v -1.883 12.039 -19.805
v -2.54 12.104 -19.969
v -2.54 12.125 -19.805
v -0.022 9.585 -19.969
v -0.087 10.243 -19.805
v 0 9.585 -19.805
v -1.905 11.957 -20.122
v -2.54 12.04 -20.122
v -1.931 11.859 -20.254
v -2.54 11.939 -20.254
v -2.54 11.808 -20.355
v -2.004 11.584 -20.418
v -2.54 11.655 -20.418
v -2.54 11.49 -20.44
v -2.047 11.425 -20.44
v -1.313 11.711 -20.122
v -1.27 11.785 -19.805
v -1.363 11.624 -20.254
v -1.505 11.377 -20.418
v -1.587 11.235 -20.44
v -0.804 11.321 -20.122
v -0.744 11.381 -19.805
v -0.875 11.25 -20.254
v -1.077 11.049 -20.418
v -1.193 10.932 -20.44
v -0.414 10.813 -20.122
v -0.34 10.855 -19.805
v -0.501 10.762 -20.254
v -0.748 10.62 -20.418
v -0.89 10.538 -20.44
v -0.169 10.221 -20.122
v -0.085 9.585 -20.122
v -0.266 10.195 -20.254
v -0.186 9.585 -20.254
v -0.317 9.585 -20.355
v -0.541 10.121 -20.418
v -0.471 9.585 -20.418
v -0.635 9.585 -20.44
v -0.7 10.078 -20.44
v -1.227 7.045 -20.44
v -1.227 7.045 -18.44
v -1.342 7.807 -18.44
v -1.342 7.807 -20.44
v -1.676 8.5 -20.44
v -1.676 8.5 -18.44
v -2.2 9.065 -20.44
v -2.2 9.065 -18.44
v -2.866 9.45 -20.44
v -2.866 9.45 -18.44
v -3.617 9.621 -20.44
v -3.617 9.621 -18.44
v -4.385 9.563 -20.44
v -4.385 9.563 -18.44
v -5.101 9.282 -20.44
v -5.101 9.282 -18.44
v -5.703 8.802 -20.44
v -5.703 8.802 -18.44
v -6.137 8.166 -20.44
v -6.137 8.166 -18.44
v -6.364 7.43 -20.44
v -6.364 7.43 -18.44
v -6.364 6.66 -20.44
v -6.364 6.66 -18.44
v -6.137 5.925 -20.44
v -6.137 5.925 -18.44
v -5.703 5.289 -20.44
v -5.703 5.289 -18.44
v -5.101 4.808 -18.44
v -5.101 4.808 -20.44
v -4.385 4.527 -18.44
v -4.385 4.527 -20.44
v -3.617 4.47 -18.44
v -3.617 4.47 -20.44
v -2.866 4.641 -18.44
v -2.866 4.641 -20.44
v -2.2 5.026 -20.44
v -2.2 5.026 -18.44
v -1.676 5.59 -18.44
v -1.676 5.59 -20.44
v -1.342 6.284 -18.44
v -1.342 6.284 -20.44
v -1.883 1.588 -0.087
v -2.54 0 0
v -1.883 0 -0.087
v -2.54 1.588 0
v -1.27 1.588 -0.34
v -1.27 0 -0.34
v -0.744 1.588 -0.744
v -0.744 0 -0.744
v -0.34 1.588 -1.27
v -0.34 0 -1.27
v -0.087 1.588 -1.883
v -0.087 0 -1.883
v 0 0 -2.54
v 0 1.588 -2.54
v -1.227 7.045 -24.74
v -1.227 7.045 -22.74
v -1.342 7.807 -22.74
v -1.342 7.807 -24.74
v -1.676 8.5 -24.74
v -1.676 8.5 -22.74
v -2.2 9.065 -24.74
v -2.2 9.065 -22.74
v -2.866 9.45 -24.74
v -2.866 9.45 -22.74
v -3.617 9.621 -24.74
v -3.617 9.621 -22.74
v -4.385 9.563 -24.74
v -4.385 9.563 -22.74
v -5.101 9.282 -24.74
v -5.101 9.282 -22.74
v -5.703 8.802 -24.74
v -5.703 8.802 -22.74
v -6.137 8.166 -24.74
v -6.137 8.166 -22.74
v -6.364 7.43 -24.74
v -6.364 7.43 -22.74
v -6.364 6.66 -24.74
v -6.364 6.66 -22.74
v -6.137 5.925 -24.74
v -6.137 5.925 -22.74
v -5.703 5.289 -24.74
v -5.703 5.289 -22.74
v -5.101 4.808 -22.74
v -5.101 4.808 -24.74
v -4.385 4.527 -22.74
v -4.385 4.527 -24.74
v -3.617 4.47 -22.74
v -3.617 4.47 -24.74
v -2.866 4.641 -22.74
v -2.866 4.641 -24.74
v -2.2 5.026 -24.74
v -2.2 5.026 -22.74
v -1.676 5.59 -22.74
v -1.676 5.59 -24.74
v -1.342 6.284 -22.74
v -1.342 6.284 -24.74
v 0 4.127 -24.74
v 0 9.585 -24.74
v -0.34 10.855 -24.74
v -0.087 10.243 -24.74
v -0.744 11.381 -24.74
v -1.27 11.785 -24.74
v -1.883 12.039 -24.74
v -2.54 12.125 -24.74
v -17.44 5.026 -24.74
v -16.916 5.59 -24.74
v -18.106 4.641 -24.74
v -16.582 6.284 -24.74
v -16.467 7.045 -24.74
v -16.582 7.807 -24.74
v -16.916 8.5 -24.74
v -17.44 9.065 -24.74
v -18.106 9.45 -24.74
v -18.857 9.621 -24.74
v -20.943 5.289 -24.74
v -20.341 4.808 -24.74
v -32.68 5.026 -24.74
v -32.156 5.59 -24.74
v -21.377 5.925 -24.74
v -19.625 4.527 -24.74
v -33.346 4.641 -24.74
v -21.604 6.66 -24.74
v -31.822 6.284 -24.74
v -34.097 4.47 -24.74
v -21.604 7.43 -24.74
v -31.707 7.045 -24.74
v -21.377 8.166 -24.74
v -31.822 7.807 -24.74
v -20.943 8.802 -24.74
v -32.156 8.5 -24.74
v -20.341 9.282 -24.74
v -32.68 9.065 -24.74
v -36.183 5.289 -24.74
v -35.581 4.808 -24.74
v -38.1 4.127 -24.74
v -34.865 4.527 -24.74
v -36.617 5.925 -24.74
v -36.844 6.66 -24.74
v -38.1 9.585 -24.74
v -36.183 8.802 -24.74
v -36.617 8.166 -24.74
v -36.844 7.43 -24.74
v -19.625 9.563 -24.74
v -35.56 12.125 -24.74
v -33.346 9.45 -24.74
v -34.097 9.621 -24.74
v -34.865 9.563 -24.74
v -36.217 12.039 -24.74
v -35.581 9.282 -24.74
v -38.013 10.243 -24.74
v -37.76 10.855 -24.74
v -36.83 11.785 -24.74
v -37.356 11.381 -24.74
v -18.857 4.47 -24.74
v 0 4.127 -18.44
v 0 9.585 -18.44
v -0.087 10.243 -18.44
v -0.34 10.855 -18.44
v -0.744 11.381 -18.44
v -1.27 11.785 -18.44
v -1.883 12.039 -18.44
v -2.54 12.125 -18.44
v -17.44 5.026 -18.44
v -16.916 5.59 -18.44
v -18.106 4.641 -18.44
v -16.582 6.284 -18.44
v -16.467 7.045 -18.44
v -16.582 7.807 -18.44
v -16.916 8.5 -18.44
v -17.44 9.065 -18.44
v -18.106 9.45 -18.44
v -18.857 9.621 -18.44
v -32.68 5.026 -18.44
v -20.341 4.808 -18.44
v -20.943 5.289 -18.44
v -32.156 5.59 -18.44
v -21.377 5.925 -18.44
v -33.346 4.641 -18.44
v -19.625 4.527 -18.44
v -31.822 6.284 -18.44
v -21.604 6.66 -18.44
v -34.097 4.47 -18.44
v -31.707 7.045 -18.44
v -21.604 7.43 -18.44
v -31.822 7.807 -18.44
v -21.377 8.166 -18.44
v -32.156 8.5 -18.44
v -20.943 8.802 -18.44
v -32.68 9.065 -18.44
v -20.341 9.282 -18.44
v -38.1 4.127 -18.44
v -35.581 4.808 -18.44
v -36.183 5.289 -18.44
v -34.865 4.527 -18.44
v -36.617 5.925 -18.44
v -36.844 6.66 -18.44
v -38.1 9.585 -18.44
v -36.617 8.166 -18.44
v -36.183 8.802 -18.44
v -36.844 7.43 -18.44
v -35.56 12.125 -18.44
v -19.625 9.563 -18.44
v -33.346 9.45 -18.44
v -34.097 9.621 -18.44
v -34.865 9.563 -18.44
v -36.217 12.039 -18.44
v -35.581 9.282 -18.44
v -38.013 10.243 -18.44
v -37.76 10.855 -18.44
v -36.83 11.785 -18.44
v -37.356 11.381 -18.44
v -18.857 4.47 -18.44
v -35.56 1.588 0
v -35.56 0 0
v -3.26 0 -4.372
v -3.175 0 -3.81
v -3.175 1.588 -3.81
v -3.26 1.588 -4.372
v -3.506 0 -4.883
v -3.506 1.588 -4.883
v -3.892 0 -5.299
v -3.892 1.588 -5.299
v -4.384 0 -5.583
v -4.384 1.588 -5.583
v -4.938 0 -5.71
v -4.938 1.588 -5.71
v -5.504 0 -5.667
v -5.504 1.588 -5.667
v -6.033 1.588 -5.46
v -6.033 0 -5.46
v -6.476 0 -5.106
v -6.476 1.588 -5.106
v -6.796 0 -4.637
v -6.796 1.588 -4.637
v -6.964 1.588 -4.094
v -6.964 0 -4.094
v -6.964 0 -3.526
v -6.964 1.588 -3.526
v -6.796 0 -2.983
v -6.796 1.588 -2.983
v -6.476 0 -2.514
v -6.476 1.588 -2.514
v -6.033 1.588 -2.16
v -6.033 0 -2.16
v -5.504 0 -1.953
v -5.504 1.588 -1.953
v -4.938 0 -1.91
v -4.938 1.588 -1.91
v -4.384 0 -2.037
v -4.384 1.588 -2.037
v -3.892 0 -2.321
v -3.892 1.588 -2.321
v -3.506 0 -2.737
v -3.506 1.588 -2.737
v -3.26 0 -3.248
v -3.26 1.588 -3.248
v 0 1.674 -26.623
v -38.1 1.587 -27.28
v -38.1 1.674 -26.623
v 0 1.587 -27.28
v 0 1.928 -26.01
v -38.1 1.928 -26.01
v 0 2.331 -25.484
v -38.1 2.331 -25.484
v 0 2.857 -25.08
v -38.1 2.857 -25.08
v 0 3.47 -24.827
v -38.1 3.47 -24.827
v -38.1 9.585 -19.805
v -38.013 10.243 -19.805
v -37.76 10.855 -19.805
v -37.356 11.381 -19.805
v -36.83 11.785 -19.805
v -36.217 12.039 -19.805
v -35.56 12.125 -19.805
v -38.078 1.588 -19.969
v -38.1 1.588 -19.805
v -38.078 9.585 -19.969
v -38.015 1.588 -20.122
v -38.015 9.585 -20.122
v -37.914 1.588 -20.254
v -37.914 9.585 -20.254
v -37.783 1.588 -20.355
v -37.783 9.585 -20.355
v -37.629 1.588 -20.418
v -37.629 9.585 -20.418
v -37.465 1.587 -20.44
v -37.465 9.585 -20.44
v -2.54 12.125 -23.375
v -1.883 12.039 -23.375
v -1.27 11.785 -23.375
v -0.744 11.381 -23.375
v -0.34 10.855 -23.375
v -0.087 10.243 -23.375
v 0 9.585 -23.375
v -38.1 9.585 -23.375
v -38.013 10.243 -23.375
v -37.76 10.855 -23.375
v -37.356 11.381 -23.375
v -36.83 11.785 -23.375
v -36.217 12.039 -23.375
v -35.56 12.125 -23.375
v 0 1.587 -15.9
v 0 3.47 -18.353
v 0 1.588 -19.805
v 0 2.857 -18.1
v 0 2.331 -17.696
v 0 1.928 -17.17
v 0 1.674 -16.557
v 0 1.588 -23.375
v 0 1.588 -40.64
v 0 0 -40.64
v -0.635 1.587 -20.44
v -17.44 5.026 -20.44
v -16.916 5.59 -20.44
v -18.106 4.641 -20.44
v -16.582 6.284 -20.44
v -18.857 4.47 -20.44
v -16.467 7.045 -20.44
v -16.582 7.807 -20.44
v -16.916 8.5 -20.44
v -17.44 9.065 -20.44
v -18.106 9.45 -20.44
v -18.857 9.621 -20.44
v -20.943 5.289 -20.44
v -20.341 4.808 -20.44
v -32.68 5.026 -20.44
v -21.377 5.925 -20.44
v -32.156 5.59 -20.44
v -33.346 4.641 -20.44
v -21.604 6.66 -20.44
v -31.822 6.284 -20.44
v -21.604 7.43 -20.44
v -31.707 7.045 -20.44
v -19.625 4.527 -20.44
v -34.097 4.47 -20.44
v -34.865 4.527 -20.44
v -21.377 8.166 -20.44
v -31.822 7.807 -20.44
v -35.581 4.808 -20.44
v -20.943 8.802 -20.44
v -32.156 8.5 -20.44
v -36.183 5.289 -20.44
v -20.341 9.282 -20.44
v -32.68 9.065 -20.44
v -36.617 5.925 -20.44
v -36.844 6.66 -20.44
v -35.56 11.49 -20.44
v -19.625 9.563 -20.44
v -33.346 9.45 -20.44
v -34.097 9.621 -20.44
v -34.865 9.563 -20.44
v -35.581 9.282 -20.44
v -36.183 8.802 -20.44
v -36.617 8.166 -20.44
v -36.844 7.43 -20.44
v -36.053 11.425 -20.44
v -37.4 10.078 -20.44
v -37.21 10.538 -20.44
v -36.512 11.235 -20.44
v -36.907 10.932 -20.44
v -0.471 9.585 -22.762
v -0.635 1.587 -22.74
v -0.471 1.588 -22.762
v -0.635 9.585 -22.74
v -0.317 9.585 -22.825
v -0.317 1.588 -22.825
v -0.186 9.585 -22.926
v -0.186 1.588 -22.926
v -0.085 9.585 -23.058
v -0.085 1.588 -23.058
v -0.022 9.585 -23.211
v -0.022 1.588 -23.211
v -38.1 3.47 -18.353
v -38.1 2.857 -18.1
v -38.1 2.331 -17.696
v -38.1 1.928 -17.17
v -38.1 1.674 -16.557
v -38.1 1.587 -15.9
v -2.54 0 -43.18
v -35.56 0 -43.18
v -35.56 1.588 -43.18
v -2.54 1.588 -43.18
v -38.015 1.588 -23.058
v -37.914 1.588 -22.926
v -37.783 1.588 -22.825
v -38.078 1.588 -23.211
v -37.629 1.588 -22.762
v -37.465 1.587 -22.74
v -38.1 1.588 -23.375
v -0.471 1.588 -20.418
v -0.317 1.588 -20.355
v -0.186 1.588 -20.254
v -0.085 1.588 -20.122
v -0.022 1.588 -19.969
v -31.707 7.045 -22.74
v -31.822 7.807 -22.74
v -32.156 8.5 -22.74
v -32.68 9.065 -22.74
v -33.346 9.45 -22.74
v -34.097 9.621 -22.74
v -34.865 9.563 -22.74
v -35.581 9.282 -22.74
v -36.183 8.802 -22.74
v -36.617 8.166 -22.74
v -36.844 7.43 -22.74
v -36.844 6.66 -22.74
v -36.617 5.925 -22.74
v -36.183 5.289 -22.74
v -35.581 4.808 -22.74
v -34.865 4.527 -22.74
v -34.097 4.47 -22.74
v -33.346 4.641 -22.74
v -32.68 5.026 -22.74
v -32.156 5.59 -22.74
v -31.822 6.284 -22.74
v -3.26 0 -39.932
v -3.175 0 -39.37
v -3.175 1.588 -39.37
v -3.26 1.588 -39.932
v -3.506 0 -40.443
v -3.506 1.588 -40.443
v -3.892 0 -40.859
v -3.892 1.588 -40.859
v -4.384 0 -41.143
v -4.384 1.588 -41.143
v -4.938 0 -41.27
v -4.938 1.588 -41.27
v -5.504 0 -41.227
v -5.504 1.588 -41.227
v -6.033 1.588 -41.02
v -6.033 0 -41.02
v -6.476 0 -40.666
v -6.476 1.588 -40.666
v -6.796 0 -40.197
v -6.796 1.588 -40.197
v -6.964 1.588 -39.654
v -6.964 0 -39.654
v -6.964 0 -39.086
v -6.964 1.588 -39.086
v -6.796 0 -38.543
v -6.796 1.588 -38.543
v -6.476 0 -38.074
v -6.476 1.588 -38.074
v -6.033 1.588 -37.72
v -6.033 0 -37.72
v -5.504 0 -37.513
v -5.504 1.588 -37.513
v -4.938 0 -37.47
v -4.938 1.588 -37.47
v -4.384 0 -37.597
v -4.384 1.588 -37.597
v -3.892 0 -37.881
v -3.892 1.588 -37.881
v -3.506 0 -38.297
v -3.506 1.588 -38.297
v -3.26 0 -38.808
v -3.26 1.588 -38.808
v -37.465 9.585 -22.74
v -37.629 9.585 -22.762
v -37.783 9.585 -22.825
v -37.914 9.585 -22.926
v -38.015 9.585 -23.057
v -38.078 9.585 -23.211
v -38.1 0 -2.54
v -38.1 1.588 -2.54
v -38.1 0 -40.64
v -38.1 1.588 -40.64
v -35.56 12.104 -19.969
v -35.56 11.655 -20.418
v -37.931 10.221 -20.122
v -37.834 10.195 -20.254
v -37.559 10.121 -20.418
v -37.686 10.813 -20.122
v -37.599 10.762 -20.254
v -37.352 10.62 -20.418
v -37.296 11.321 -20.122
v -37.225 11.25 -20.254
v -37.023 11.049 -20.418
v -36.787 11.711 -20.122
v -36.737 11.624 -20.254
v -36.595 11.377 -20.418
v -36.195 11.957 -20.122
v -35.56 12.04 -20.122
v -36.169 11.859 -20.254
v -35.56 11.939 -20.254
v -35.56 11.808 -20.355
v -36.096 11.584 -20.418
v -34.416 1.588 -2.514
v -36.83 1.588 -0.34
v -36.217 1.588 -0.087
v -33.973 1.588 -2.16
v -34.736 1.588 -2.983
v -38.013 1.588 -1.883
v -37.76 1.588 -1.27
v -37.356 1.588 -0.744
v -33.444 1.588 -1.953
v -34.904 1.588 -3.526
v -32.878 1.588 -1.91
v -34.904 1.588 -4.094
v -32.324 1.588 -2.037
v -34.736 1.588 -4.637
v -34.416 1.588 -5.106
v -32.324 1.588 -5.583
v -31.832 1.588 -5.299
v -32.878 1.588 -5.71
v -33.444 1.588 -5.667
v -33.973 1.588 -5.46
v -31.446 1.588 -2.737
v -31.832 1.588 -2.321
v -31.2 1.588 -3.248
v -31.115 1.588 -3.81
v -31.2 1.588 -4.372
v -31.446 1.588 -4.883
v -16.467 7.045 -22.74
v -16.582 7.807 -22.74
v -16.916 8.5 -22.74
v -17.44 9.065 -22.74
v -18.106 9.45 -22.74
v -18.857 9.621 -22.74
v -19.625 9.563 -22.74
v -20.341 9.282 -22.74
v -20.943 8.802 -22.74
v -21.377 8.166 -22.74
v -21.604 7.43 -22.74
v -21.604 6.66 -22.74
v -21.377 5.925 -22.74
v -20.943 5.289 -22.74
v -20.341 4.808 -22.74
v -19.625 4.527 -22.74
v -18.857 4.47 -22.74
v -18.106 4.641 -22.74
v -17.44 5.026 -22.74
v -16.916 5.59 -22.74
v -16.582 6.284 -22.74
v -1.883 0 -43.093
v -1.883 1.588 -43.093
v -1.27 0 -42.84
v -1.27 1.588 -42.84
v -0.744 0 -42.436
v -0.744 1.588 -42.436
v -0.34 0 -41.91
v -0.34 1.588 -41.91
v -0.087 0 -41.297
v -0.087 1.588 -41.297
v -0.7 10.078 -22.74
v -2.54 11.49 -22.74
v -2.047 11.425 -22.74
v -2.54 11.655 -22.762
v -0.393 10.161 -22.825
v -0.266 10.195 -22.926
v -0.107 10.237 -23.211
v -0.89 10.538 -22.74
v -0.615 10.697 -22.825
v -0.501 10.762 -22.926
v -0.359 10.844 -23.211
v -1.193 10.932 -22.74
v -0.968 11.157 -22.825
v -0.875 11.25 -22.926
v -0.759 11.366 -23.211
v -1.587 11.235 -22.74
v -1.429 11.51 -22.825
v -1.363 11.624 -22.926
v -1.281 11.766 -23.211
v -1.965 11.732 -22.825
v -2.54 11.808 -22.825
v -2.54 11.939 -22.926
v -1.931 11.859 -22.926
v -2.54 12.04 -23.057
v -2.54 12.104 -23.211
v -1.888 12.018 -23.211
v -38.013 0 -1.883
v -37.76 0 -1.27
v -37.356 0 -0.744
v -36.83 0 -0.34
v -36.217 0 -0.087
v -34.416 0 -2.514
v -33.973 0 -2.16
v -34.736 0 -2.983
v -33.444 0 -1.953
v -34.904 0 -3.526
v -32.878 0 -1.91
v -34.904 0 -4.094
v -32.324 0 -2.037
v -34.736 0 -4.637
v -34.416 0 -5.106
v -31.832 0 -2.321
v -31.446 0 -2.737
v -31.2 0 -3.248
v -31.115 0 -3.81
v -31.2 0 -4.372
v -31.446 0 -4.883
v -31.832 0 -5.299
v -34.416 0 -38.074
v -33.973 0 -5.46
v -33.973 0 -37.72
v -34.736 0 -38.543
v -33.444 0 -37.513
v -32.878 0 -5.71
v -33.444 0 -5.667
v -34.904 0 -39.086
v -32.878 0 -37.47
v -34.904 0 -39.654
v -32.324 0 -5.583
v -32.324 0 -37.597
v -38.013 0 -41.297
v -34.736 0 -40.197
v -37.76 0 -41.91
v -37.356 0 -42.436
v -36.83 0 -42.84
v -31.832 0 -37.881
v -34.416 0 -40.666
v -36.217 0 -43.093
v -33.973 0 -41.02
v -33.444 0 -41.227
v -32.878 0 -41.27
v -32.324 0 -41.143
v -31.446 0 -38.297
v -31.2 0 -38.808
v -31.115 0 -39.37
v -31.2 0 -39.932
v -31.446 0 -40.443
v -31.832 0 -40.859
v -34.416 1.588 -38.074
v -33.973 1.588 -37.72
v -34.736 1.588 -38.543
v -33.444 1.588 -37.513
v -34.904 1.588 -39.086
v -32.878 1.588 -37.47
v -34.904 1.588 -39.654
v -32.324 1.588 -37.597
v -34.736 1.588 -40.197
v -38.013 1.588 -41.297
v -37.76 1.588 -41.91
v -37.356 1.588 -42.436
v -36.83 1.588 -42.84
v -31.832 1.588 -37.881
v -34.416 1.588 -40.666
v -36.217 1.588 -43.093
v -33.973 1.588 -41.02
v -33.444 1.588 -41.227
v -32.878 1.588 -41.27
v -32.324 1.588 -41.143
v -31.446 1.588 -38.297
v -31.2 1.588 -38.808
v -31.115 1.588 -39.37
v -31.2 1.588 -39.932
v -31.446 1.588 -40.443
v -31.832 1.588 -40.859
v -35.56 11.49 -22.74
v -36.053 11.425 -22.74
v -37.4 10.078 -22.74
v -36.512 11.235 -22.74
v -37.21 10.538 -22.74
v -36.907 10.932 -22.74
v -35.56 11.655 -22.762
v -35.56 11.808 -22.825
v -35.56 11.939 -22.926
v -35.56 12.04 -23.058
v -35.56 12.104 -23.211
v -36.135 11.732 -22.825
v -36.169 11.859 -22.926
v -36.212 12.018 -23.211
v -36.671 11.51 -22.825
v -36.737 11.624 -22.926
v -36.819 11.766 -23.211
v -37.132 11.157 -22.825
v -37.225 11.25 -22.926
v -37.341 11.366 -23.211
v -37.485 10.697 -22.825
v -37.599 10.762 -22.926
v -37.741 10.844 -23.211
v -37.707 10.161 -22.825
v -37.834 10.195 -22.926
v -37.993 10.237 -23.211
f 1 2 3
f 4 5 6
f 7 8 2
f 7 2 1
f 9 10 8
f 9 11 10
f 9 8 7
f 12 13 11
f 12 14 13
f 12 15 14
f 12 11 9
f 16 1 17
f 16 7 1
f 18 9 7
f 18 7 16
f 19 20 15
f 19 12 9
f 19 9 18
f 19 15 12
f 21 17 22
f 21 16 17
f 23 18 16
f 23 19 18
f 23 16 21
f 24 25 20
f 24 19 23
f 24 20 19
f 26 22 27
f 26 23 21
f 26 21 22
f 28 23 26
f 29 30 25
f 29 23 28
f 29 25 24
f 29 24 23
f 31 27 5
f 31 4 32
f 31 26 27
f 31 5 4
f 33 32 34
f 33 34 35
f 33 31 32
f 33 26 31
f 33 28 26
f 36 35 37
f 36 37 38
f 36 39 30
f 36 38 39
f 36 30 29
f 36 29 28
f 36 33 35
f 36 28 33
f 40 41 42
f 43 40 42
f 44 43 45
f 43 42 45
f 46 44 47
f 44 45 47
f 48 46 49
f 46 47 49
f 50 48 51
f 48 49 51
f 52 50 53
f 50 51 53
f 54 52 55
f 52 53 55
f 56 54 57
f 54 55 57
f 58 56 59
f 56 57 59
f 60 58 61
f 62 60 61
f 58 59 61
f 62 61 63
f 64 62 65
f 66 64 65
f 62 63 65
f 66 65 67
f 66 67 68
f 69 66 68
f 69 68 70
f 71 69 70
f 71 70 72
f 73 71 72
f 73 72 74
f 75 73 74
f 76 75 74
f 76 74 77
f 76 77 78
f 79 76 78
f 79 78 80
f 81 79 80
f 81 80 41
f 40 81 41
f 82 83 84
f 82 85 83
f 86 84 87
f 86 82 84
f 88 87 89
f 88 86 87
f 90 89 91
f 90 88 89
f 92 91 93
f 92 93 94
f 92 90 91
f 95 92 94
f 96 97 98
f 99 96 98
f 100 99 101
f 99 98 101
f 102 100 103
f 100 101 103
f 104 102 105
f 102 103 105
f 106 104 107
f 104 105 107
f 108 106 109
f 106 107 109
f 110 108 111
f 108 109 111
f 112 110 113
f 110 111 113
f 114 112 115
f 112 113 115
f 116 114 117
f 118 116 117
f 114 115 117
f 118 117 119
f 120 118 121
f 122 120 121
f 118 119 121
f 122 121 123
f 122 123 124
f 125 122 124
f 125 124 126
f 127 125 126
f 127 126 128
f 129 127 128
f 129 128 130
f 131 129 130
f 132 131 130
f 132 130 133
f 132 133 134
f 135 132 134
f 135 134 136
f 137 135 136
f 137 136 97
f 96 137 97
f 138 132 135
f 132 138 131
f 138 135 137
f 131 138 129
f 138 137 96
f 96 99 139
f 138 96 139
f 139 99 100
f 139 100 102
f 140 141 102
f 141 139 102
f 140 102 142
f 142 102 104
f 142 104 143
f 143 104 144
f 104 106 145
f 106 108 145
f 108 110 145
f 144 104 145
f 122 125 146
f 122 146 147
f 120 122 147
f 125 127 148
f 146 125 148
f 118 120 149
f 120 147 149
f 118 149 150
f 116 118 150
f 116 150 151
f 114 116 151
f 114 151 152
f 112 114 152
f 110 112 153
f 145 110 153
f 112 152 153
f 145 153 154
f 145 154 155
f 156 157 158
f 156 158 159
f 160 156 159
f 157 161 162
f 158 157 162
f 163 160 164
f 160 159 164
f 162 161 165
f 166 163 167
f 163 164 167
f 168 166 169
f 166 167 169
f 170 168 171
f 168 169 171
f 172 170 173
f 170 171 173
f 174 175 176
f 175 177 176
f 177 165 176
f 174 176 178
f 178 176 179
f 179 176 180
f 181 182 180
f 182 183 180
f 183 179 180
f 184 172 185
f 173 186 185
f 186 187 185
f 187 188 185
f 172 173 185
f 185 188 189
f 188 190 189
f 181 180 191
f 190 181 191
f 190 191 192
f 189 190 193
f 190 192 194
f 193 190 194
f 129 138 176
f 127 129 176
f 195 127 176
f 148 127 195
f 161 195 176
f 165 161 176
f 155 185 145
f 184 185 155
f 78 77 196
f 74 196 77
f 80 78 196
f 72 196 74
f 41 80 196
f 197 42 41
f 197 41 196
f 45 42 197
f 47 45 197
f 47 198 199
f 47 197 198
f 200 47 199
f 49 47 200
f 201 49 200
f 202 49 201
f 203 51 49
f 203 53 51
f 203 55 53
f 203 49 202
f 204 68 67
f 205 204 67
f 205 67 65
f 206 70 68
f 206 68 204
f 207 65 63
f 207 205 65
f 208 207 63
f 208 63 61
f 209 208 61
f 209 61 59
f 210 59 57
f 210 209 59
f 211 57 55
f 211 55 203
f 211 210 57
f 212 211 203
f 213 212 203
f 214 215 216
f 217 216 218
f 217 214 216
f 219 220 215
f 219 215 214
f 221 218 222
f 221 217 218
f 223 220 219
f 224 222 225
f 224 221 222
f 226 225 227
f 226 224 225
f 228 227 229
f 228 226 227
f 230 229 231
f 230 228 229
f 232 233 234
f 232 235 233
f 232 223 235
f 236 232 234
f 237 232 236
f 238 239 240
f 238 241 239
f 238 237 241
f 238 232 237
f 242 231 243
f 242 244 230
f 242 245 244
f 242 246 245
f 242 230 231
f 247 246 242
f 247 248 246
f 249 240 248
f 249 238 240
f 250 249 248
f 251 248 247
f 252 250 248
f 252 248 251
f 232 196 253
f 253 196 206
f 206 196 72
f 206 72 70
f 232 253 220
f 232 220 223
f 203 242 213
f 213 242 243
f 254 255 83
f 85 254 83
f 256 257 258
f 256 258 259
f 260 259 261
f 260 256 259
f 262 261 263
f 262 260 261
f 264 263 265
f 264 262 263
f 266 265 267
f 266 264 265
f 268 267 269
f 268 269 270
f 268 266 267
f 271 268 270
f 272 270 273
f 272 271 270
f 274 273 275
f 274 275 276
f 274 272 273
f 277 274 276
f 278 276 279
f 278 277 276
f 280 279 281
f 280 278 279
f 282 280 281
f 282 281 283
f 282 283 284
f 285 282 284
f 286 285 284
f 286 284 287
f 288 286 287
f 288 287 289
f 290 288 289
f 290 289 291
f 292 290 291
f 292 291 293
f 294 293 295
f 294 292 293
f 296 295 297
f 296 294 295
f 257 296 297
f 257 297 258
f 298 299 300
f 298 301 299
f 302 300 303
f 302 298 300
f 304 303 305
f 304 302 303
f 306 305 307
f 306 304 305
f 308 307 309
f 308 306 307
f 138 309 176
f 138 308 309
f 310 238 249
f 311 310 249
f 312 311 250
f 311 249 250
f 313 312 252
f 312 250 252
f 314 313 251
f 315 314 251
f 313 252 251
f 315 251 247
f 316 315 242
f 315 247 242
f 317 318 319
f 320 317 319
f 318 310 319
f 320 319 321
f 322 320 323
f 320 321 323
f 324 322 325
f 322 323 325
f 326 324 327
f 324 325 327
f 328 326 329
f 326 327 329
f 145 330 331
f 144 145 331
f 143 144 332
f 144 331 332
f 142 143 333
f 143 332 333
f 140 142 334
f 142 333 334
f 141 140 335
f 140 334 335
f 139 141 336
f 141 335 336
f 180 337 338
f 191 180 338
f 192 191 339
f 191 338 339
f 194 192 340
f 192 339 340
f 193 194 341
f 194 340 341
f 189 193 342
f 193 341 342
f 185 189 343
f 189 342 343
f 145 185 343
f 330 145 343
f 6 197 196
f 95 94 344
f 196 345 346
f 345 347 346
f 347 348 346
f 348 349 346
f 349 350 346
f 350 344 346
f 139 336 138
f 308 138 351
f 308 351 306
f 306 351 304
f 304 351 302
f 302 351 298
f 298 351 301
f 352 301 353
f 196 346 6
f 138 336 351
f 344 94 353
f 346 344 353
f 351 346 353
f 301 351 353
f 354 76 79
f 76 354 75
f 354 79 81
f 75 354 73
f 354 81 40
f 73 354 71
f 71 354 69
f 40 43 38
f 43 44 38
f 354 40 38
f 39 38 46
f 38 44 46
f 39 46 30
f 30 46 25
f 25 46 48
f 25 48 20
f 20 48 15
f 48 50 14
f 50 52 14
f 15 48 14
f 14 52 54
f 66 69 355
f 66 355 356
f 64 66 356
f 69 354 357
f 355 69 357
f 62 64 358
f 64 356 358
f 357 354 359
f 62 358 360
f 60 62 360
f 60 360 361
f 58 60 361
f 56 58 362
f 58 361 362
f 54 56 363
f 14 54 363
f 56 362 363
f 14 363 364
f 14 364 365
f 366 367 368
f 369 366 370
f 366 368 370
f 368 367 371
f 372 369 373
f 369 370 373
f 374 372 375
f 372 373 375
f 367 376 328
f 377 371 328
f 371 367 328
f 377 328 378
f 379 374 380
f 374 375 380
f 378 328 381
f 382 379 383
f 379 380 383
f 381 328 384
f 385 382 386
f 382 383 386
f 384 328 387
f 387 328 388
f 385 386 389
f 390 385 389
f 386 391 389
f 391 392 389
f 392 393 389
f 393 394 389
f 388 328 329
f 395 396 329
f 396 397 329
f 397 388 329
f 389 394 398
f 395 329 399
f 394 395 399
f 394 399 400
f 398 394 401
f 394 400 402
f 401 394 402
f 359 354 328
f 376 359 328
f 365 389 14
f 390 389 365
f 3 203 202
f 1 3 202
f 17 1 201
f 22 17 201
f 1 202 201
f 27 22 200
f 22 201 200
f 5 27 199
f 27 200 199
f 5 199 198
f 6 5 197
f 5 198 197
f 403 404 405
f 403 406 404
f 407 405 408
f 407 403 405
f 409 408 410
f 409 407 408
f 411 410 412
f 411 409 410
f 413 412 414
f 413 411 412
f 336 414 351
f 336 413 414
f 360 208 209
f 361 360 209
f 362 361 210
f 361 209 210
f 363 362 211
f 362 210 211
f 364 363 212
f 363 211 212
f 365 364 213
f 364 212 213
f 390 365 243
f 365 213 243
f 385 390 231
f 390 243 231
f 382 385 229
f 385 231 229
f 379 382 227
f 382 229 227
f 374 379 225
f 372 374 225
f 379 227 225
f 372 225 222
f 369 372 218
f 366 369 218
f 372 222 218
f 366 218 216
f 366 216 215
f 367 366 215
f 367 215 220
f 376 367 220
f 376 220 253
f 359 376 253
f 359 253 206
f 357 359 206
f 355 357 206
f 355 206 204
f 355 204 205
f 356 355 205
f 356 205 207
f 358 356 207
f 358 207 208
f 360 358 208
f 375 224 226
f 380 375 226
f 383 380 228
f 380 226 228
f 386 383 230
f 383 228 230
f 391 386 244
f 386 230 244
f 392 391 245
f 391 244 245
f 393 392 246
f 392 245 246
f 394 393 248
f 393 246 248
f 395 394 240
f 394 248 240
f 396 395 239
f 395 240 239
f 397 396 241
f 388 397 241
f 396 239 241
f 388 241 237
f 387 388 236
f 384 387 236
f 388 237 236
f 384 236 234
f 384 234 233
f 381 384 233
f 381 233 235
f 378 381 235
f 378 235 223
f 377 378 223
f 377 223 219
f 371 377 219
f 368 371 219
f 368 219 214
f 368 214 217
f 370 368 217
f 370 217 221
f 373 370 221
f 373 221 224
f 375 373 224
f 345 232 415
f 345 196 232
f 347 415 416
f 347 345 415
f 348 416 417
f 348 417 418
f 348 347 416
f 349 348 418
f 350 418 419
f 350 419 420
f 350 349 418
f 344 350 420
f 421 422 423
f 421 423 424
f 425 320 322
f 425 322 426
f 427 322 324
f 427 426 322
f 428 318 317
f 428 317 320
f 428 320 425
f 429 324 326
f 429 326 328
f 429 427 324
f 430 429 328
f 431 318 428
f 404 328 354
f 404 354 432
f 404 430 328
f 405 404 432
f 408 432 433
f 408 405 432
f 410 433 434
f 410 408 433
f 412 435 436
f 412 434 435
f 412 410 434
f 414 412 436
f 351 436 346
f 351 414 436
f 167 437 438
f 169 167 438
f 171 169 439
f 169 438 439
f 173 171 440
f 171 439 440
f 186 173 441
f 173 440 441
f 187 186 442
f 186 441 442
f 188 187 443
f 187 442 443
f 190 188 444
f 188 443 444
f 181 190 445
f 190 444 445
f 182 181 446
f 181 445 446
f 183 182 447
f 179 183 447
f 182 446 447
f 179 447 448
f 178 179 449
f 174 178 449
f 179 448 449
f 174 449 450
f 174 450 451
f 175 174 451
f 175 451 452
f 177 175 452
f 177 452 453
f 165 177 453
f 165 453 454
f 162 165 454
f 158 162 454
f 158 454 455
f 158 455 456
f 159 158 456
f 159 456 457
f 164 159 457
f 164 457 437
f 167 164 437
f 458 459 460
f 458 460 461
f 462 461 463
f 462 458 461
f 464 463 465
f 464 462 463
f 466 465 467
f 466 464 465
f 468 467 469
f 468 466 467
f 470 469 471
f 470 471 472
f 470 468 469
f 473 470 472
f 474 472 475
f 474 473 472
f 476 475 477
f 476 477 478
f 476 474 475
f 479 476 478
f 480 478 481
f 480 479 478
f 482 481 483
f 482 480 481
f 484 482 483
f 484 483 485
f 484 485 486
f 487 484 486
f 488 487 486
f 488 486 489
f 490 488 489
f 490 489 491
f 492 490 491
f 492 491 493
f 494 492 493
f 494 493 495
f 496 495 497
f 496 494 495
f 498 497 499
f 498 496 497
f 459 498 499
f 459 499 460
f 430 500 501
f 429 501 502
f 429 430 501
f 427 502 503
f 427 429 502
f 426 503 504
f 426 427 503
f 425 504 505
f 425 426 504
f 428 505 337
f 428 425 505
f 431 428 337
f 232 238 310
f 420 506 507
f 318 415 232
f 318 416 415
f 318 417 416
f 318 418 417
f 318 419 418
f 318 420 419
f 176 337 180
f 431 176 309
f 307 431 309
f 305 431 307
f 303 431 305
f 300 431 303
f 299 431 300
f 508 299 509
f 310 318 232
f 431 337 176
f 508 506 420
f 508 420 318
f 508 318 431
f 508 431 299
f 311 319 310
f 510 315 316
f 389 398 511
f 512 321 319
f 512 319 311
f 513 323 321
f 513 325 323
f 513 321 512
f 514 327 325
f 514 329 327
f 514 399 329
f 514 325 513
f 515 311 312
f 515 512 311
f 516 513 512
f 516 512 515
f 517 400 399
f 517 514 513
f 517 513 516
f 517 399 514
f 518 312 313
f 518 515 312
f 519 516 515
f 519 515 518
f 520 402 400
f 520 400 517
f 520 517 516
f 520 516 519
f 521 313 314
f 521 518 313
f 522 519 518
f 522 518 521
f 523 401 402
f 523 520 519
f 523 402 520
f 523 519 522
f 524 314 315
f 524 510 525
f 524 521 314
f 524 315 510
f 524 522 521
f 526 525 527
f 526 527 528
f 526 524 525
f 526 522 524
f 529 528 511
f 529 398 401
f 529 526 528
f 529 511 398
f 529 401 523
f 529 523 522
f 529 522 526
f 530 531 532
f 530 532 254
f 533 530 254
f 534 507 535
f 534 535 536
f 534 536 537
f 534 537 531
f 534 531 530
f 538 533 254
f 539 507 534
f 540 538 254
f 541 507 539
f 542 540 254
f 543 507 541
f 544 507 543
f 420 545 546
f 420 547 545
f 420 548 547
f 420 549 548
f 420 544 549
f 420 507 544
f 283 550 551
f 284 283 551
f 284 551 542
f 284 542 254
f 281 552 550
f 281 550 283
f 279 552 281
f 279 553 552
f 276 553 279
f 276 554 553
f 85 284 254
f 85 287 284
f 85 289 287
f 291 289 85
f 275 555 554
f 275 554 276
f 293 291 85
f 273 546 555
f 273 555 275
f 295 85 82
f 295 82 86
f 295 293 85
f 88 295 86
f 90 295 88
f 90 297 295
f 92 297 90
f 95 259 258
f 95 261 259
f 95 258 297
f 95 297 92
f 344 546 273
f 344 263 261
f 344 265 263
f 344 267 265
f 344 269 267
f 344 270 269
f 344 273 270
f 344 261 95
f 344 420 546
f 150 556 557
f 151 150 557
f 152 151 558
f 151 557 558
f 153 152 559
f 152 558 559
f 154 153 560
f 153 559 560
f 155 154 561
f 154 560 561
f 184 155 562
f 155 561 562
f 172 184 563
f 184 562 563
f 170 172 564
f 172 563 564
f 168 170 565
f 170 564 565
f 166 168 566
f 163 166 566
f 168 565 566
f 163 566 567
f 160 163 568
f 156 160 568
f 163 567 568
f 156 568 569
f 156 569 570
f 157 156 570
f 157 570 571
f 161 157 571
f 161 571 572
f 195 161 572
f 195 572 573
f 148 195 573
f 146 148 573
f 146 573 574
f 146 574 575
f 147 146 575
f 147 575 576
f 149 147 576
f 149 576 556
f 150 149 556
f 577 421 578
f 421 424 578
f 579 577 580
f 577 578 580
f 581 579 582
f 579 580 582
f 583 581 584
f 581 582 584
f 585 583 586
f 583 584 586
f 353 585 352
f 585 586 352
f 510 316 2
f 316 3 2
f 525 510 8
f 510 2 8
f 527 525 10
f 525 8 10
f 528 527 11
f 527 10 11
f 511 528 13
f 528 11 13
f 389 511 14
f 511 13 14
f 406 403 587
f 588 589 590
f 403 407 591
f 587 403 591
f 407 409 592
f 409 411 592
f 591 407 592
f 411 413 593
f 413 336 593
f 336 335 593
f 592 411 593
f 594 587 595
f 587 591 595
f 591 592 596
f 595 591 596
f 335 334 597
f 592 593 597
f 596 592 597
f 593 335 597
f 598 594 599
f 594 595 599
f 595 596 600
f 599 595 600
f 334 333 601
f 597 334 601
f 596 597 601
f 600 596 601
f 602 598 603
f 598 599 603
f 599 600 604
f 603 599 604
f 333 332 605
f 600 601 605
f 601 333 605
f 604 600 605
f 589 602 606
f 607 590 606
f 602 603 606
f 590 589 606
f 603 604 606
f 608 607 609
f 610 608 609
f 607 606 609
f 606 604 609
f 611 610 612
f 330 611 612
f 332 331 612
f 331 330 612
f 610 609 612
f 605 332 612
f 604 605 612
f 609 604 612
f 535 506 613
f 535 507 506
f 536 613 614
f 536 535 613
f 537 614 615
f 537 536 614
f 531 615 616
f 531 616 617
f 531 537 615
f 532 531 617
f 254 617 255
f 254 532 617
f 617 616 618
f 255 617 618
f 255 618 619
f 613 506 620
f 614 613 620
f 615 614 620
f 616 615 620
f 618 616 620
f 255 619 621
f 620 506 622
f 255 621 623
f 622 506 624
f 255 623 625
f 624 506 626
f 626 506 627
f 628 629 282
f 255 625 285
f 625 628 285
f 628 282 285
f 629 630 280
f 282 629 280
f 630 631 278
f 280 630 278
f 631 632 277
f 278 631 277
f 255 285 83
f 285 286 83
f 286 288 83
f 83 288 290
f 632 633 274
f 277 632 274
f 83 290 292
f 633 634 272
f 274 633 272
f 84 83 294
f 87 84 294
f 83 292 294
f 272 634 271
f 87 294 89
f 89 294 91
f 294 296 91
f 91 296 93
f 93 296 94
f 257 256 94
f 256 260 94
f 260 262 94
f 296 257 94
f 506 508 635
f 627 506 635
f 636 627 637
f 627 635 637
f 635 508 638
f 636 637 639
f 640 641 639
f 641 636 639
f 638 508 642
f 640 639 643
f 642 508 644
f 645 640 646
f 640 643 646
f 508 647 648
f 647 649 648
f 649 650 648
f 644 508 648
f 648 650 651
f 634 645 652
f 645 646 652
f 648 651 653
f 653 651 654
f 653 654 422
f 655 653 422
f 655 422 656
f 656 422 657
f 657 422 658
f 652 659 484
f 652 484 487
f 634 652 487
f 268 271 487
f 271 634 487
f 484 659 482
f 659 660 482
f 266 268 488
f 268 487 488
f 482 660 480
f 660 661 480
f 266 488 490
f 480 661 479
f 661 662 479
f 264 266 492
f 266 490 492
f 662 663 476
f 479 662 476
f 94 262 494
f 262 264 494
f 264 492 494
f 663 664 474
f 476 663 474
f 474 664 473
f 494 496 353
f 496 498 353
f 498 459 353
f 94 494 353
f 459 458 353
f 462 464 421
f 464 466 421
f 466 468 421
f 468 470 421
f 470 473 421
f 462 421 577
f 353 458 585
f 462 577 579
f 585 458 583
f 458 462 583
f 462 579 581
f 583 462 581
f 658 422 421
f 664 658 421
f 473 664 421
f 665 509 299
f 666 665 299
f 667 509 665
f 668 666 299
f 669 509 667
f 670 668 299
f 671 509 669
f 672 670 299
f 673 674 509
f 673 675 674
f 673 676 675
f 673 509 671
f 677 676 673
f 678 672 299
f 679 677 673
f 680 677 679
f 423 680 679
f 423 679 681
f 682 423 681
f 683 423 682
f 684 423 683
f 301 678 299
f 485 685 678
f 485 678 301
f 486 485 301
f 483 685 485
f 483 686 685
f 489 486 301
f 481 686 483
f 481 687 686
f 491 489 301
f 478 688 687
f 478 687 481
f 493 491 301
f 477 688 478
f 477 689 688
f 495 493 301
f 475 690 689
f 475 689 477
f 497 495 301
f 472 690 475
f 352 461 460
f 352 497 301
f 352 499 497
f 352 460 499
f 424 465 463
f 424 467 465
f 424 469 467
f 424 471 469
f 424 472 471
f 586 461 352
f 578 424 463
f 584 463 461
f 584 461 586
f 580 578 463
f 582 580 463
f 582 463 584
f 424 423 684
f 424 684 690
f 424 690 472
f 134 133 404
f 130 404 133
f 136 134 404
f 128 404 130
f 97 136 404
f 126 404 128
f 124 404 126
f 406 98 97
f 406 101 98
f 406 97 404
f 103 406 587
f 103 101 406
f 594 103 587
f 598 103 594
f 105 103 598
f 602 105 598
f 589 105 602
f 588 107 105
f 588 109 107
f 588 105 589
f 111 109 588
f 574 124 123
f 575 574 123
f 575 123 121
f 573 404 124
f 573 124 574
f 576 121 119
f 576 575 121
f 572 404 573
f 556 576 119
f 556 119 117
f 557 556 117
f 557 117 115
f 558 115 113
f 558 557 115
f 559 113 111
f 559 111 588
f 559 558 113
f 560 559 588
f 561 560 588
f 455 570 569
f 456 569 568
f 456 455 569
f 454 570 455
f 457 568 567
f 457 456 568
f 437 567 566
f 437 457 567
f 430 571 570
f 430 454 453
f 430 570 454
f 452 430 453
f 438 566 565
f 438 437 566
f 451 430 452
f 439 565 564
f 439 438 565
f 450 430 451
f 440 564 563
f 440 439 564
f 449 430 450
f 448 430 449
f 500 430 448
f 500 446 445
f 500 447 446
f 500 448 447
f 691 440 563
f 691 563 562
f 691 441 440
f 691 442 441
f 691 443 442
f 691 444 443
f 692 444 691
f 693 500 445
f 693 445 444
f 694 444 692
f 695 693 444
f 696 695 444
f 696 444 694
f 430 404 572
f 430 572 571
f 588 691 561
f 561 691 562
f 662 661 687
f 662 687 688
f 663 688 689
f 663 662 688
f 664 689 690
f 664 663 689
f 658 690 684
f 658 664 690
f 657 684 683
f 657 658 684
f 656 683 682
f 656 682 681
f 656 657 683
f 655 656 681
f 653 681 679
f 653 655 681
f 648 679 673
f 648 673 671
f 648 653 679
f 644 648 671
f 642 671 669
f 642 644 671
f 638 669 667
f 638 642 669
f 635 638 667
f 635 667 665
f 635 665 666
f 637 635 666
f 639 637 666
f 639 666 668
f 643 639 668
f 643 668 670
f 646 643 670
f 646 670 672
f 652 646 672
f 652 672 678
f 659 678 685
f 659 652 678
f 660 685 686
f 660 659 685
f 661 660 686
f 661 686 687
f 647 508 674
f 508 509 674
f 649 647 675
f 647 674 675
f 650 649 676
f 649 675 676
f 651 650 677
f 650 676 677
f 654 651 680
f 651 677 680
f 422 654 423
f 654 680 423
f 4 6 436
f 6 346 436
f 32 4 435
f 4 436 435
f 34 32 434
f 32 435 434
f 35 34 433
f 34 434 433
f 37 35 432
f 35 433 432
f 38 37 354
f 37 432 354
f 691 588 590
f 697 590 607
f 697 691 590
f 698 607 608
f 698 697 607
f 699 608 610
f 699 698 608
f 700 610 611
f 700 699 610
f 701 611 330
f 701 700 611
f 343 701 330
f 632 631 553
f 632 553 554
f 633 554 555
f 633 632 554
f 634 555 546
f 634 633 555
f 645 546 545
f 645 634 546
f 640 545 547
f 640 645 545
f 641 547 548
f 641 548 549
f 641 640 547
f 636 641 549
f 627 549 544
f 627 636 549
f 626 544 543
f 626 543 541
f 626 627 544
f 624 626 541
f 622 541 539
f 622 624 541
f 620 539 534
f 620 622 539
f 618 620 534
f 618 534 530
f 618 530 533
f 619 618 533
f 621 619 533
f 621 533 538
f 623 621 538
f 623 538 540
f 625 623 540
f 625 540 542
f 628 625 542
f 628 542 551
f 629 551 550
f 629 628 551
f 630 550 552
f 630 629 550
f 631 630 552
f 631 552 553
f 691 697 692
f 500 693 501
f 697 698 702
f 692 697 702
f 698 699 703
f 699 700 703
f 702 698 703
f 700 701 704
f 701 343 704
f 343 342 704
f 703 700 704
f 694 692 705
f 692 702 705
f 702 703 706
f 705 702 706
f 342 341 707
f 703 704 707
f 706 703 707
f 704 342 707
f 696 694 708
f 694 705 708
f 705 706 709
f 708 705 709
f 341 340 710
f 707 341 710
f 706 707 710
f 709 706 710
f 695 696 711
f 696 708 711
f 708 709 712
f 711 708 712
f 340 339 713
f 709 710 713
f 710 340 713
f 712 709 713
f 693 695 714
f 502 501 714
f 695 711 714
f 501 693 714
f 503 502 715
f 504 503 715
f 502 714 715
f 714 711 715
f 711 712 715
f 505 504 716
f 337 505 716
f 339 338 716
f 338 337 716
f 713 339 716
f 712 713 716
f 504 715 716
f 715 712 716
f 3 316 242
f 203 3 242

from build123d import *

# Parameters (mm, degrees)
SKETCH1_W               = 38.1
SKETCH1_H               = 43.18
SKETCH1_R               = 1.905
BOSS_EXTRUDE1_DEPTH     = 1.5875
SKETCH2_W               = 2
SKETCH2_H               = 10.5378
BOSS_EXTRUDE2_DEPTH     = 38.1
SKETCH4_R               = 2.58285
CUT_EXTRUDE1_DEPTH      = 19.44
CUT_EXTRUDE1_DEPTH_BACK = 25.74
FILLET1_R               = 2.54
FILLET2_R               = 2.54
FILLET4_R               = 2.54
FILLET5_R               = 0.635


with BuildPart() as part:
    # Sketch1 → Boss-Extrude1 (new body)
    with BuildSketch(Plane(origin=(0, 0, 0), x_dir=(1, 0, 0), z_dir=(0, 1, 0))):
        with Locations((-19.05, 21.59)):
            Rectangle(SKETCH1_W, SKETCH1_H)
        with Locations((-33.02, 39.37)):
            Circle(SKETCH1_R, mode=Mode.SUBTRACT)
        with Locations((-33.02, 3.81)):
            Circle(SKETCH1_R, mode=Mode.SUBTRACT)
        with Locations((-5.08, 3.81)):
            Circle(SKETCH1_R, mode=Mode.SUBTRACT)
        with Locations((-5.08, 39.37)):
            Circle(SKETCH1_R, mode=Mode.SUBTRACT)
    extrude(amount=BOSS_EXTRUDE1_DEPTH)

    # Sketch2 → Boss-Extrude2 (add)
    with BuildSketch(Plane.ZY.offset(38.1)):
        with Locations((-23.74, 6.8564)):
            Rectangle(SKETCH2_W, SKETCH2_H)
        with Locations((-19.44, 6.8564)):
            Rectangle(SKETCH2_W, SKETCH2_H)
    extrude(amount=-BOSS_EXTRUDE2_DEPTH)

    # Sketch4 → Cut-Extrude1 (cut, two sides)
    with BuildSketch(Plane.XY.offset(-18.44)) as cut_extrude1_sk:
        with Locations((-34.29, 7.0453)):
            Circle(SKETCH4_R)
        with Locations((-19.05, 7.0453)):
            Circle(SKETCH4_R)
        with Locations((-3.81, 7.0453)):
            Circle(SKETCH4_R)
    extrude(amount=CUT_EXTRUDE1_DEPTH, mode=Mode.SUBTRACT)
    extrude(cut_extrude1_sk.sketch, amount=-CUT_EXTRUDE1_DEPTH_BACK, mode=Mode.SUBTRACT)

    # Fillet1
    fillet1_edges = [part.edges().sort_by_distance(p)[0] for p in [
        (0, 12.1253, -19.44),
        (-38.1, 12.1253, -19.44),
        (0, 12.1253, -23.74),
        (-38.1, 12.1253, -23.74),
    ]]
    fillet(fillet1_edges, radius=FILLET1_R)

    # Fillet2
    fillet2_edges = [part.edges().sort_by_distance(p)[0] for p in [
        (-19.05, 1.5875, -18.44),
        (-19.05, 1.5875, -24.74),
    ]]
    fillet(fillet2_edges, radius=FILLET2_R)

    # Fillet4
    fillet4_edges = [part.edges().sort_by_distance(p)[0] for p in [
        (0, 0.79375, 0),
        (-38.1, 0.79375, 0),
        (-38.1, 0.79375, -43.18),
        (0, 0.79375, -43.18),
    ]]
    fillet(fillet4_edges, radius=FILLET4_R)

    # Fillet5
    fillet5_edges = [part.edges().sort_by_distance(p)[0] for p in [
        (-38.1, 5.5864, -20.44),
        (0, 5.5864, -22.74),
        (-19.05, 12.1253, -22.74),
        (0, 5.5864, -20.44),
        (-38.1, 5.5864, -22.74),
        (-37.356051224, 11.381351224, -22.74),
        (-0.743948776, 11.381351224, -22.74),
        (-19.05, 12.1253, -20.44),
        (-37.356051224, 11.381351224, -20.44),
        (-0.743948776, 11.381351224, -20.44),
    ]]
    fillet(fillet5_edges, radius=FILLET5_R)


solid = part.part
